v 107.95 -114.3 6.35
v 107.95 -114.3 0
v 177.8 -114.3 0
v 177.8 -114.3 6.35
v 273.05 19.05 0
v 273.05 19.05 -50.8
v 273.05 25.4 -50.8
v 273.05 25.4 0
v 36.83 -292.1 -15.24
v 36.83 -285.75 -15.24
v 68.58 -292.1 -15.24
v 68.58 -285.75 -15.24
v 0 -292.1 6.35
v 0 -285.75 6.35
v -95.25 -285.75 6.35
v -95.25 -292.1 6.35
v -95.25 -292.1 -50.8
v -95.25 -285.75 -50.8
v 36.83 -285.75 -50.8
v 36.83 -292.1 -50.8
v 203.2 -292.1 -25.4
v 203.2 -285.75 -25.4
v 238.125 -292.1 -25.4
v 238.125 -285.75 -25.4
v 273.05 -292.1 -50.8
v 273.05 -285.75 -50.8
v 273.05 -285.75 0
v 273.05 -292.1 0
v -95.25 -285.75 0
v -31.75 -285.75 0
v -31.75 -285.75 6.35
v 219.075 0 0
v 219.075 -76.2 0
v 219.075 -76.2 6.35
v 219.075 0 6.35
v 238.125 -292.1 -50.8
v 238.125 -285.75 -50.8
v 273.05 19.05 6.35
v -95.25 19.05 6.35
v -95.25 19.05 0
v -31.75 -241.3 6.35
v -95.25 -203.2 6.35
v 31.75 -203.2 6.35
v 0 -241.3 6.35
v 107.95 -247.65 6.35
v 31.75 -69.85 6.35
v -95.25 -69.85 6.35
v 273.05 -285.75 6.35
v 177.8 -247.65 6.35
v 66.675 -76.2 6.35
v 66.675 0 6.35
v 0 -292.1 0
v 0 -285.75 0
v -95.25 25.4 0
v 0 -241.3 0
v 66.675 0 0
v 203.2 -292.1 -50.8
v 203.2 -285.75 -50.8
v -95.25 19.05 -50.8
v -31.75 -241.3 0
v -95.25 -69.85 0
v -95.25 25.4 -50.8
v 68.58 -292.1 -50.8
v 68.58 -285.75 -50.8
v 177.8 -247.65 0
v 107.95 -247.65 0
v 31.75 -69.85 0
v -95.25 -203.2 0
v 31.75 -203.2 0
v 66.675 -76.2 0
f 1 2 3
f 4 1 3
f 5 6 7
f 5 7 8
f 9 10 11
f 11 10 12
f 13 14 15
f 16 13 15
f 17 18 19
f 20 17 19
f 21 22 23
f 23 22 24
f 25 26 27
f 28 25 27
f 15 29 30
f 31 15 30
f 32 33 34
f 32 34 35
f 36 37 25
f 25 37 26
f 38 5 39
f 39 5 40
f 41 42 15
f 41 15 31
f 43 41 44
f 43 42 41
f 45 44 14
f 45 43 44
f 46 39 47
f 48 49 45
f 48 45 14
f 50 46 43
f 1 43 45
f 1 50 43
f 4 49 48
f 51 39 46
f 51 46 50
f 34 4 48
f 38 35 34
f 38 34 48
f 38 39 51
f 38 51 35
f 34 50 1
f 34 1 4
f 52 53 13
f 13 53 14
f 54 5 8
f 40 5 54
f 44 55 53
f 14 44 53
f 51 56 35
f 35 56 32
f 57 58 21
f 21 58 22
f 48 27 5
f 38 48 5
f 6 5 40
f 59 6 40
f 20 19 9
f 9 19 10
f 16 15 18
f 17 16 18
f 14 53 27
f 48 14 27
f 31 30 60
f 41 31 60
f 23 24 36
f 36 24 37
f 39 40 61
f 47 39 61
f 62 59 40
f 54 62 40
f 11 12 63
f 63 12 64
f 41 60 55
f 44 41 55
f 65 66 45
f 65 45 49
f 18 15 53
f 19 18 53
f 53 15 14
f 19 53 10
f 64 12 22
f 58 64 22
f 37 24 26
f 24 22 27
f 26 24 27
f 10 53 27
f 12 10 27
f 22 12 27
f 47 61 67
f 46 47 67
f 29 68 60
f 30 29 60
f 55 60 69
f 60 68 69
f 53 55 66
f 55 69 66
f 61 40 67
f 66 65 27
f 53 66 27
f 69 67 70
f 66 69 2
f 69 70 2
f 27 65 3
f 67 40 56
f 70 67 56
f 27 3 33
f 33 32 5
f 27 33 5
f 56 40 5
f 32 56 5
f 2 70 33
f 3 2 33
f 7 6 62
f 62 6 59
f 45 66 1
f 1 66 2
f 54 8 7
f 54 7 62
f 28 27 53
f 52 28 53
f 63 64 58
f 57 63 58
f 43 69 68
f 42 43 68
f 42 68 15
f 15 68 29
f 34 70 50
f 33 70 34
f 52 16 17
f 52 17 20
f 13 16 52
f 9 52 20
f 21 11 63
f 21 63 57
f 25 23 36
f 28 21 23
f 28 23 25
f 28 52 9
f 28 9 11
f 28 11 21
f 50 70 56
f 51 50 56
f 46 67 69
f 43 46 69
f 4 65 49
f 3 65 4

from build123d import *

# Parameters (mm, degrees)
F0_W     = 69.85
F0_H     = 133.35
F0_W_2   = 152.4
F0_H_2   = 76.2
F1_DEPTH = 6.35
F2_W     = 368.3
F2_H     = 50.8
F3_DEPTH = 6.35
F5_DEPTH = 6.35


with BuildPart() as f1:
    # F0 (on Top) → F1 (new body)
    with BuildSketch(Plane.XY):
        Polygon((273.05, 19.05), (-95.25, 19.05), (-95.25, -69.85), (31.75, -69.85), (31.75, -203.2), (-95.25, -203.2), (-95.25, -285.75), (-31.75, -285.75), (-31.75, -241.3), (0, -241.3), (0, -285.75), (273.05, -285.75), align=None)
        with Locations((142.875, -180.975)):
            Rectangle(F0_W, F0_H, mode=Mode.SUBTRACT)
        with Locations((142.875, -38.1)):
            Rectangle(F0_W_2, F0_H_2, mode=Mode.SUBTRACT)
    extrude(amount=F1_DEPTH)


with BuildPart() as f3:
    # F2 (on face) → F3 (new body)
    with BuildSketch(Plane(origin=(0, 19.05, 0), x_dir=(-1, 0, 0), z_dir=(0, 1, 0))):
        with Locations((-88.9, -25.4)):
            Rectangle(F2_W, F2_H)
    extrude(amount=F3_DEPTH)


with BuildPart() as f5:
    # F4 (on face) → F5 (new body)
    with BuildSketch(Plane.XZ.offset(285.75)):
        Polygon((0, 0), (0, 6.35), (-95.25, 6.35), (-95.25, -50.8), (36.83, -50.8), (36.83, -15.24), (68.58, -15.24), (68.58, -50.8), (203.2, -50.8), (203.2, -25.4), (238.125, -25.4), (238.125, -50.8), (273.05, -50.8), (273.05, 0), align=None)
    extrude(amount=F5_DEPTH)


solid = Compound([f1.part, f3.part, f5.part])
